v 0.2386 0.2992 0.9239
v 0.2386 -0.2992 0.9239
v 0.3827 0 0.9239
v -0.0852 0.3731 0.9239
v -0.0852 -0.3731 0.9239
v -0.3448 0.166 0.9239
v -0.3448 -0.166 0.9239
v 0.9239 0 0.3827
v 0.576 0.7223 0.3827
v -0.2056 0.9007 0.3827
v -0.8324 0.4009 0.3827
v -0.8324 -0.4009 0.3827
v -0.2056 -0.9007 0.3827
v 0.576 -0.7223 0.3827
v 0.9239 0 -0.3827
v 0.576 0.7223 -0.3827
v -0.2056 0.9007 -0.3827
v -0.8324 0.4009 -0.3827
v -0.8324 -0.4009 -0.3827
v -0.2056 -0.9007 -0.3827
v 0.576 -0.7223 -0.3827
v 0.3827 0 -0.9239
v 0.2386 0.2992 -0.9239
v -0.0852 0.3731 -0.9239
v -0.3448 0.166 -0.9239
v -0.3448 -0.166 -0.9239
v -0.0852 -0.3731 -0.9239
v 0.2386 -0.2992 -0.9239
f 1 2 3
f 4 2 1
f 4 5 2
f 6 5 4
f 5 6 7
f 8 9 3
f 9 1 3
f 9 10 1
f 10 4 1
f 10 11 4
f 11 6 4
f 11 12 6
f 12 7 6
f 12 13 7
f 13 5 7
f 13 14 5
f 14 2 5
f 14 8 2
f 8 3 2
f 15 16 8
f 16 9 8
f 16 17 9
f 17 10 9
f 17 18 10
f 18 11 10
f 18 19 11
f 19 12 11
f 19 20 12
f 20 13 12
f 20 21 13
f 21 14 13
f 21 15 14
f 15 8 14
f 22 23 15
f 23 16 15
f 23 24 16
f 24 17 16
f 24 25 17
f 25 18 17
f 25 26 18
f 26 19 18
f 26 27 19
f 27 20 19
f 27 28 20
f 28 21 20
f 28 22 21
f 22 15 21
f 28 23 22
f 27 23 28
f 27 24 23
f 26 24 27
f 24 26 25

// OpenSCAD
//=============================================================================
// Icon used for the Complexity Tool.
// =============================================================================

sphere($fn = 7);
